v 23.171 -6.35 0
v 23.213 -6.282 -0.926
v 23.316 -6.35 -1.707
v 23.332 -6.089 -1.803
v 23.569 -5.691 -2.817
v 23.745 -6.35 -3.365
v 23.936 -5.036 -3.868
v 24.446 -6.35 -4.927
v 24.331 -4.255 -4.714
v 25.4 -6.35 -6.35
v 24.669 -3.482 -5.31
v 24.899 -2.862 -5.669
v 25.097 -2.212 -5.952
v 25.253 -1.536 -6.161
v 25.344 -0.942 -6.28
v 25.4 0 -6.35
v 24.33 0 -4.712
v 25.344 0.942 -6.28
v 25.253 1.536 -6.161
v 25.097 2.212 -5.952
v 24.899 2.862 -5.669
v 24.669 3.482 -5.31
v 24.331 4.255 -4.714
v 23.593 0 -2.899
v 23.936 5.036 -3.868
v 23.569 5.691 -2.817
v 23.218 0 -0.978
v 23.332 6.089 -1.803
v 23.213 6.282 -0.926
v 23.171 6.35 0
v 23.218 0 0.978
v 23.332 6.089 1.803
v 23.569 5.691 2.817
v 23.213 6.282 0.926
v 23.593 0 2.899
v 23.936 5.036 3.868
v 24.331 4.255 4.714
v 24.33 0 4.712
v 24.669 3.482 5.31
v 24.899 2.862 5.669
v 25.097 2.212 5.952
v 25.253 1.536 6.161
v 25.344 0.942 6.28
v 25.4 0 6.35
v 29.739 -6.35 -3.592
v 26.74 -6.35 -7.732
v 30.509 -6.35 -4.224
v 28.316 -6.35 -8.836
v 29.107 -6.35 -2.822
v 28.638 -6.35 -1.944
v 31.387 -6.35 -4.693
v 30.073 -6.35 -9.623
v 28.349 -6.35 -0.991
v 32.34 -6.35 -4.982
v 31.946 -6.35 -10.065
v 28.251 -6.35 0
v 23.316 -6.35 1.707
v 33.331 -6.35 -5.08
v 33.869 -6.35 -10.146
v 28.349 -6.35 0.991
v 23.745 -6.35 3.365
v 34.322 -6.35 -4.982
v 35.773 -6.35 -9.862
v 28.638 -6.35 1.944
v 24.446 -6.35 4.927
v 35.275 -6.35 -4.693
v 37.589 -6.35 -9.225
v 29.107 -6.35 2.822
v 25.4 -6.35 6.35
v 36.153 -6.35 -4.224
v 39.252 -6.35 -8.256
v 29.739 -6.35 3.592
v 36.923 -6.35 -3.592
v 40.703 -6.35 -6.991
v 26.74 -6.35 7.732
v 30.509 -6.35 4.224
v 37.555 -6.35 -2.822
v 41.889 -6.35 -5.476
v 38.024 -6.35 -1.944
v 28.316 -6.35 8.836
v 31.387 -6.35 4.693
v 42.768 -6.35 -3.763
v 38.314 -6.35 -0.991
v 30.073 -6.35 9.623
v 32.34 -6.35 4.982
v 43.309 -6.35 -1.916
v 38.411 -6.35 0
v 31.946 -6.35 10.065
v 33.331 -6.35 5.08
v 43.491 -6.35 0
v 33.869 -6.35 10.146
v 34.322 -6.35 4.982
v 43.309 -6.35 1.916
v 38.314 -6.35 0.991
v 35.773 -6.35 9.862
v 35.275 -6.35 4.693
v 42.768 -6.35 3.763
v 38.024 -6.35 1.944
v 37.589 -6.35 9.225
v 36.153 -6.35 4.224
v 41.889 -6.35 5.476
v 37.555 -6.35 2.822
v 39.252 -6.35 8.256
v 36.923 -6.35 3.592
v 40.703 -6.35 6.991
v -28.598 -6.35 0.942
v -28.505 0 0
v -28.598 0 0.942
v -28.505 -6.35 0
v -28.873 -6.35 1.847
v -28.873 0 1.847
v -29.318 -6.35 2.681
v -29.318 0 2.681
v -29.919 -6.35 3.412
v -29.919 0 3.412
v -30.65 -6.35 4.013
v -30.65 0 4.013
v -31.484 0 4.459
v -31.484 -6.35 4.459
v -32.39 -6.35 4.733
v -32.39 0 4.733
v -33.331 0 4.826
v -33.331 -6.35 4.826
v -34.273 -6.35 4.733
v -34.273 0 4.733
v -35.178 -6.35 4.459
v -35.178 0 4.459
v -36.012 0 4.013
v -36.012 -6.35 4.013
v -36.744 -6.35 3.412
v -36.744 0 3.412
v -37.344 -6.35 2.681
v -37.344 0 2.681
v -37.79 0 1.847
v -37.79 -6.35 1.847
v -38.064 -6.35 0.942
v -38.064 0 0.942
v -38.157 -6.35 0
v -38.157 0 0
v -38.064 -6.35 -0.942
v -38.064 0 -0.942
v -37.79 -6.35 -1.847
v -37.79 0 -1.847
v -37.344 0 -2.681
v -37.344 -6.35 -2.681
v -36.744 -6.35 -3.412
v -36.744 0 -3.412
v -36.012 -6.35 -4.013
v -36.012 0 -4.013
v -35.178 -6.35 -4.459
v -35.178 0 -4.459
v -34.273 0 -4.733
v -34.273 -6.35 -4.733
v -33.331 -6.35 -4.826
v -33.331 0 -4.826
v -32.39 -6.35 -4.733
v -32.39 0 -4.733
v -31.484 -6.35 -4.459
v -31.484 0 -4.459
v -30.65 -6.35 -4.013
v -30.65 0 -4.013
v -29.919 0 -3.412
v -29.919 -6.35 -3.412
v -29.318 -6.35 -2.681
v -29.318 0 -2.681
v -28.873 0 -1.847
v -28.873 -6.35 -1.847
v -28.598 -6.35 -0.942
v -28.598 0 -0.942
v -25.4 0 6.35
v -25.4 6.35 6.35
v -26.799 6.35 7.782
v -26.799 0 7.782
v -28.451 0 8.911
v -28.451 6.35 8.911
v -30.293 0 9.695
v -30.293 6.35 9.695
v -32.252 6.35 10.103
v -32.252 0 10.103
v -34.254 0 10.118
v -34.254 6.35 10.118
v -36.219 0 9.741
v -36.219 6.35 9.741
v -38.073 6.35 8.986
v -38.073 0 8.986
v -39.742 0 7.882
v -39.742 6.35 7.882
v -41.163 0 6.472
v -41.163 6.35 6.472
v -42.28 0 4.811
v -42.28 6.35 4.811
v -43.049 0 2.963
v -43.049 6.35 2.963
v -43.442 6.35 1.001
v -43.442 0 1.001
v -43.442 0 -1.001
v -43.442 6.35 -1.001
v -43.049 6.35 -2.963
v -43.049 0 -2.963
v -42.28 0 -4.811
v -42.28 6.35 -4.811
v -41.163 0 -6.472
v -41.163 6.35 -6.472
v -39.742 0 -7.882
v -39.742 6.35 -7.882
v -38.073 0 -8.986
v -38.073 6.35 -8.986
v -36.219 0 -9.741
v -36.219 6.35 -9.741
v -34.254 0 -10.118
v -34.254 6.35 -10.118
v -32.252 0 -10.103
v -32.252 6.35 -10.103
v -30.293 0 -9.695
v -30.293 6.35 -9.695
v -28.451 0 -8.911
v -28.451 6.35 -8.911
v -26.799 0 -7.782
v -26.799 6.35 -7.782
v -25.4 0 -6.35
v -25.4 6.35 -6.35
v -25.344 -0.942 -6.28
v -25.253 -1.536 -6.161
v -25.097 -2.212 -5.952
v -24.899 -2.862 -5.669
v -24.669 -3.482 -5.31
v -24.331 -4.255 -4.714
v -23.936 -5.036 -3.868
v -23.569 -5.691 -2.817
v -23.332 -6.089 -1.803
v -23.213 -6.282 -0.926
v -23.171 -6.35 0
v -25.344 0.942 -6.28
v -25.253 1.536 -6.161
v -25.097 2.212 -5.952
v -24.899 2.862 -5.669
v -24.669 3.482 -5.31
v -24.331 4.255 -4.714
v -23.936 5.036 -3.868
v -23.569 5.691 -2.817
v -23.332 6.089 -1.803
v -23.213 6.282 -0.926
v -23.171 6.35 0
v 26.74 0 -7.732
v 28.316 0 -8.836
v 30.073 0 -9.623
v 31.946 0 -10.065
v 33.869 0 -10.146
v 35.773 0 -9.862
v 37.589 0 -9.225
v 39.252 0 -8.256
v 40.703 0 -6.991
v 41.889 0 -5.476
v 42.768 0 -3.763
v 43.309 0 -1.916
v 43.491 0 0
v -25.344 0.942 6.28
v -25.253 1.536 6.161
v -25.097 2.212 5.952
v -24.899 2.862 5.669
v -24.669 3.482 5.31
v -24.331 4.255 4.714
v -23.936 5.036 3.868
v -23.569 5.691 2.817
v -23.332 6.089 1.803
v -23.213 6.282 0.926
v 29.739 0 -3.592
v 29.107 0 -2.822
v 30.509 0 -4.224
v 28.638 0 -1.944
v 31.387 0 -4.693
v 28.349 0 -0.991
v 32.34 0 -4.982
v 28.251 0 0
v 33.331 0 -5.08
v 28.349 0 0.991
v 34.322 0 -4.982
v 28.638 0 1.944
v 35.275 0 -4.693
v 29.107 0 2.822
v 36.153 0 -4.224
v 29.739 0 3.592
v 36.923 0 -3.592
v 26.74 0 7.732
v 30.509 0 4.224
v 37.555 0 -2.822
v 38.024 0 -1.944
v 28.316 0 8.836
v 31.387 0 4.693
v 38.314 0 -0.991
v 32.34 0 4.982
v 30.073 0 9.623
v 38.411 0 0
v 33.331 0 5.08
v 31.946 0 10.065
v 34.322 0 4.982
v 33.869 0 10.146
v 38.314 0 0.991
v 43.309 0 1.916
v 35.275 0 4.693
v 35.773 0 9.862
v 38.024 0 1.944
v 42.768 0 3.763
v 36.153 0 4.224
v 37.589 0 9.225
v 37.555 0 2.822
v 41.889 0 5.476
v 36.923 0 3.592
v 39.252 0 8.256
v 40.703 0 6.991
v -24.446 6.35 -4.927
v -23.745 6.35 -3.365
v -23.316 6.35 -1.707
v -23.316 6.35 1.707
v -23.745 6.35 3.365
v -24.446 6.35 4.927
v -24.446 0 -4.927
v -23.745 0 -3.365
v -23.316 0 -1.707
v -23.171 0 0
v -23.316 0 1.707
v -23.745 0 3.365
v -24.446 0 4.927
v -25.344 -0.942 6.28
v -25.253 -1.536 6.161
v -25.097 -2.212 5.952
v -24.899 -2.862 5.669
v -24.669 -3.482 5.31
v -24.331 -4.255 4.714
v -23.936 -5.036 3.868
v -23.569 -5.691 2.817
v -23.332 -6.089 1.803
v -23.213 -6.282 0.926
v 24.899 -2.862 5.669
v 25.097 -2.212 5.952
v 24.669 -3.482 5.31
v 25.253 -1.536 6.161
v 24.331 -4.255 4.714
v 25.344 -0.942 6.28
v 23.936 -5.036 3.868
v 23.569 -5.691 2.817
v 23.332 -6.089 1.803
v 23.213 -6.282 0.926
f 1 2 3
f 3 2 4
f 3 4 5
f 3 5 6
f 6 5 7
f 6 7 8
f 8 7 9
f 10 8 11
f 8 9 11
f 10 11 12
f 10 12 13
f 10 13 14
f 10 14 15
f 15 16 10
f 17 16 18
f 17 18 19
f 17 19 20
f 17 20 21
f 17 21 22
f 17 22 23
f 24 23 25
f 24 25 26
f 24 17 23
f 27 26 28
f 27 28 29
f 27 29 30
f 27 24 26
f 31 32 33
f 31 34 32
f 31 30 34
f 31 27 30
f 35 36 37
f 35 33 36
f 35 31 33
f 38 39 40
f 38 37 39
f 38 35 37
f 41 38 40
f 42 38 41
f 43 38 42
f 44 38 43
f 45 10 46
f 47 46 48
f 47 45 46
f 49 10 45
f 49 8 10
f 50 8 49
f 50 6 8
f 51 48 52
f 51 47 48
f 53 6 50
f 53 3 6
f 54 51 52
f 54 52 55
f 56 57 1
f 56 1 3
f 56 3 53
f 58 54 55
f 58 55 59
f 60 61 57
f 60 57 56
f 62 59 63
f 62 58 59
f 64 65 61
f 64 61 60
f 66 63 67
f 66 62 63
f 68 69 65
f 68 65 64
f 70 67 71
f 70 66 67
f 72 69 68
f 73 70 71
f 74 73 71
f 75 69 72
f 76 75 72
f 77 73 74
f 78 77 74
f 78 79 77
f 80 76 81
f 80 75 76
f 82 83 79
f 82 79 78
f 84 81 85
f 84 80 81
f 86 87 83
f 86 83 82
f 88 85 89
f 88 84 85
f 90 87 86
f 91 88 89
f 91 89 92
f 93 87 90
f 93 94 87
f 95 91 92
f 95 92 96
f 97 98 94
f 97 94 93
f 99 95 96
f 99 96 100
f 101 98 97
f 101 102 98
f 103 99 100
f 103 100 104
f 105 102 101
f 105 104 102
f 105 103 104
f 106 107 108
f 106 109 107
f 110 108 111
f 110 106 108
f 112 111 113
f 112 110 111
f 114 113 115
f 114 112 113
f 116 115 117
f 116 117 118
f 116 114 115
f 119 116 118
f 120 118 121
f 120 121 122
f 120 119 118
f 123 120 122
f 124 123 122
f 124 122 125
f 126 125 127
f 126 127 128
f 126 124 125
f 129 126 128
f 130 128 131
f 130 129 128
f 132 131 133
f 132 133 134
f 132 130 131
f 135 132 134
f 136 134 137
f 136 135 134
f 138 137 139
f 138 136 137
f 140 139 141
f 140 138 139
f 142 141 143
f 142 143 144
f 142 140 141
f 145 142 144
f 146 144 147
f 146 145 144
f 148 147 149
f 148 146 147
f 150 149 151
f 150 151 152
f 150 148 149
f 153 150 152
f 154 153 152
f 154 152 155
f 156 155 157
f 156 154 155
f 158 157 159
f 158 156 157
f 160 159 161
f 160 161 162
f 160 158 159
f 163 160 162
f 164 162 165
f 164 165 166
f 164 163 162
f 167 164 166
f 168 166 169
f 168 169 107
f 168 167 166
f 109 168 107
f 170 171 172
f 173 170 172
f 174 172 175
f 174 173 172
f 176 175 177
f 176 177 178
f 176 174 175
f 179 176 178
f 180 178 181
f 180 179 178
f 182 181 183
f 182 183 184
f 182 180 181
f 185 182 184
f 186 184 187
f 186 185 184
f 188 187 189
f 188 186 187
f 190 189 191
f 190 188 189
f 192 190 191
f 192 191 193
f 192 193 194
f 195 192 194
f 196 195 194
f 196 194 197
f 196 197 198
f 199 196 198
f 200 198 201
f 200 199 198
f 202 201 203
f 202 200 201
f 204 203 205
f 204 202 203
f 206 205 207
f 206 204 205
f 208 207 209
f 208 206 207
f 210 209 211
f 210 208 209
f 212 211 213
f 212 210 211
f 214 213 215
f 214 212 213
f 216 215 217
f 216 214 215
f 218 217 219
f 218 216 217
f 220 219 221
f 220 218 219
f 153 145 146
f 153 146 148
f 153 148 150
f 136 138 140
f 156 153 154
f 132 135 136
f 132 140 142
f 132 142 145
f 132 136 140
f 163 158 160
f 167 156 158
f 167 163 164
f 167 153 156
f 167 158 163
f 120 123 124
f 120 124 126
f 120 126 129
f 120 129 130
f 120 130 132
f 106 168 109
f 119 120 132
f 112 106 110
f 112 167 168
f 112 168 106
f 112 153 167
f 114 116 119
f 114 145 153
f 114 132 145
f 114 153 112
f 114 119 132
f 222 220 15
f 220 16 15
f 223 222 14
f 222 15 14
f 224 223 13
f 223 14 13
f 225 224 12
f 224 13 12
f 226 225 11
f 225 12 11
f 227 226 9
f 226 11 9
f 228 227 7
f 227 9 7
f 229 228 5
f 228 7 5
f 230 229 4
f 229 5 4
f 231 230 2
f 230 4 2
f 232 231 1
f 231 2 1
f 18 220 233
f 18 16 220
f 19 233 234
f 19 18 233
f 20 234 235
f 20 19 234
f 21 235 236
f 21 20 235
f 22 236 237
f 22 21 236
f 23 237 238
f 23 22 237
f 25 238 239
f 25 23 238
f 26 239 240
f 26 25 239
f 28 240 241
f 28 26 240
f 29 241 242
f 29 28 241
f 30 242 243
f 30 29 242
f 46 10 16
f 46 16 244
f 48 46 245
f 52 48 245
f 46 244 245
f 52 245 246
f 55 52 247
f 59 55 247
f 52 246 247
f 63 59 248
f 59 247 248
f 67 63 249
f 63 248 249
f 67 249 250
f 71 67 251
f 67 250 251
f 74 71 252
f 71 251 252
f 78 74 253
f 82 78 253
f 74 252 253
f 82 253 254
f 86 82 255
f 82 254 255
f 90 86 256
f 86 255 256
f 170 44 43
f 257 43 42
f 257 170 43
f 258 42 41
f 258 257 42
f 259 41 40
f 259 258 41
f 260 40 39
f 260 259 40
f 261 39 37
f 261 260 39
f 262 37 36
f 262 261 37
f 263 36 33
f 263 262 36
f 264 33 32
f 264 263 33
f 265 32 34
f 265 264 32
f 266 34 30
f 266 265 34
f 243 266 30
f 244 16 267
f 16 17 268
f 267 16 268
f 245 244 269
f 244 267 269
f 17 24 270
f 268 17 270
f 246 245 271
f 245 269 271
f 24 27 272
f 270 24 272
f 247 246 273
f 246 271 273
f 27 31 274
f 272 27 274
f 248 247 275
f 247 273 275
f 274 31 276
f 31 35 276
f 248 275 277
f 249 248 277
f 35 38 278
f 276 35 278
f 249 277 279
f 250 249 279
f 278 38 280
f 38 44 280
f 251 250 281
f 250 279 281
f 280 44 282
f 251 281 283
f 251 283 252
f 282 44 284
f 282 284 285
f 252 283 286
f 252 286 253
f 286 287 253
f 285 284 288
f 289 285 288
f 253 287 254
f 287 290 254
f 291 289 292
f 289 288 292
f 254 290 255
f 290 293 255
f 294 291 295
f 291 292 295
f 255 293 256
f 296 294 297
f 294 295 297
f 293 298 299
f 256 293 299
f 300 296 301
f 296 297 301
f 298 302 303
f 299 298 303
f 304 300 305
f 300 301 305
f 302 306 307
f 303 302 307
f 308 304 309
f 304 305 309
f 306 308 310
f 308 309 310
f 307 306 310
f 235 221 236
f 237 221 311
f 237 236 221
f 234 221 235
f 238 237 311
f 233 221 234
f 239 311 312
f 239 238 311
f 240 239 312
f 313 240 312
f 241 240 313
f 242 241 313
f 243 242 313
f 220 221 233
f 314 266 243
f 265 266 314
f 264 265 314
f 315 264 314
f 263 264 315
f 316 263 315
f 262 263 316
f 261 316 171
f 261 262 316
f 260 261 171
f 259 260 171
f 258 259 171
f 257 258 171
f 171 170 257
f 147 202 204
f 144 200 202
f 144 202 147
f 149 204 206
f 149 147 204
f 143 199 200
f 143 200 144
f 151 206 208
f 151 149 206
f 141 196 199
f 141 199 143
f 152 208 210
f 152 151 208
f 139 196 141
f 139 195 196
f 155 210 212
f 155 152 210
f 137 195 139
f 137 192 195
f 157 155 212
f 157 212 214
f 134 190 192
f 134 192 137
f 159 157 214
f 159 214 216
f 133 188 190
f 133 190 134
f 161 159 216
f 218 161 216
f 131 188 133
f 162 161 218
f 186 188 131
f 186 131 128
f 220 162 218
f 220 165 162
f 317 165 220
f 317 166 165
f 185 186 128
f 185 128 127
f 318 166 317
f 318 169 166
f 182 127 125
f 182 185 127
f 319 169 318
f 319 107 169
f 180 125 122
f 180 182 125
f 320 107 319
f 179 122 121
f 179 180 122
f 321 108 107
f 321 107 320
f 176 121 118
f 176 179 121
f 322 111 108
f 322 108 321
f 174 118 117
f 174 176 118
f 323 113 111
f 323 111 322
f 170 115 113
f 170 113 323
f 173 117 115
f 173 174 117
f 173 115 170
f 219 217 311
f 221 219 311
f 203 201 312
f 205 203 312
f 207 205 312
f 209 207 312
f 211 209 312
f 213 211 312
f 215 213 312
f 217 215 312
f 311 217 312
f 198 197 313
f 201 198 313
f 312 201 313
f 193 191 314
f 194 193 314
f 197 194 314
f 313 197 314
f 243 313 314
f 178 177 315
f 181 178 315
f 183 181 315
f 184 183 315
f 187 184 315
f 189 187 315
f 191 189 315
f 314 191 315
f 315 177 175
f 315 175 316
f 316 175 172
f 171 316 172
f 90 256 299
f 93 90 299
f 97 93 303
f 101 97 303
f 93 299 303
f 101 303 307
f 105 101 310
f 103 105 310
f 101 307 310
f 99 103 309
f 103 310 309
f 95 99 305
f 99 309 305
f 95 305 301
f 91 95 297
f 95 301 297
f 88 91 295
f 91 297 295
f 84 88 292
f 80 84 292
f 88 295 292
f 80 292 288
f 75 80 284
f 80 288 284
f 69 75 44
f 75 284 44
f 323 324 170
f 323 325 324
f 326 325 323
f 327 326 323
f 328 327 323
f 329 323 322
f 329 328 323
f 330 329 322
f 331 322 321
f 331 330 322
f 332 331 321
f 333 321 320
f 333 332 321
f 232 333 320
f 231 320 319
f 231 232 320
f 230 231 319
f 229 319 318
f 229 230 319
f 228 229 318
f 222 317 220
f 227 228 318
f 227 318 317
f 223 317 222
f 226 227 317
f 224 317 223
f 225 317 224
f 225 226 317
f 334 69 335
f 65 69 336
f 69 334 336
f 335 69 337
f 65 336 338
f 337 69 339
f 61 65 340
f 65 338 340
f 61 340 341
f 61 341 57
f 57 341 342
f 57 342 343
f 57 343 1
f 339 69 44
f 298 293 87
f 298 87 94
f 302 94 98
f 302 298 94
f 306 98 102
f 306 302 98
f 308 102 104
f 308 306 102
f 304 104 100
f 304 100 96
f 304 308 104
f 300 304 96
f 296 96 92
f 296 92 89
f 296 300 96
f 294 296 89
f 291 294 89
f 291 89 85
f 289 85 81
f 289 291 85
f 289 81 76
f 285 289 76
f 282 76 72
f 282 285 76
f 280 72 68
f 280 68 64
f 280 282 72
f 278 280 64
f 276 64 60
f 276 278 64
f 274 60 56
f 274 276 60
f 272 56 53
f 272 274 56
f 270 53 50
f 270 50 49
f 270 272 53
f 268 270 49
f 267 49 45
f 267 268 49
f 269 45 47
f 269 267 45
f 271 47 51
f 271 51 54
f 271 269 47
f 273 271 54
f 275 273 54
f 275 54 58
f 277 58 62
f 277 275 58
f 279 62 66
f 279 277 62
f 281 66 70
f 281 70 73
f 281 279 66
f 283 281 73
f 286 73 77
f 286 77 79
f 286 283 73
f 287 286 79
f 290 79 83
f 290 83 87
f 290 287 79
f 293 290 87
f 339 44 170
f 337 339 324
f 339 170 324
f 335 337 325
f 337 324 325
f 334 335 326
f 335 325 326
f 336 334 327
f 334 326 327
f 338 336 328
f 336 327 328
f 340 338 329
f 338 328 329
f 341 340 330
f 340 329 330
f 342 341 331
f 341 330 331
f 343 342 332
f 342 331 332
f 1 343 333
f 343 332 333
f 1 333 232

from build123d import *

# Parameters (mm, degrees)
F1_DEPTH = 6.35
F2_R     = 6.3499
F0_R     = 5.08
F3_DEPTH = 6.35
F0_R_2   = 4.826
F4_DEPTH = 6.35
F5_DEPTH = 6.35


# Not quite as in the source:
# - a fillet or chamfer is up to 0.001 mm smaller than in the source, because OpenCascade refuses the exact size


with BuildPart() as f1:
    # F0 (on Front) → F1 (new body, symmetric)
    with BuildSketch(Plane.XZ):
        with BuildLine():
            Line((25.4, 6.35), (-25.4, 6.35))
            ThreePointArc((-25.4, 6.35), (-23.7445407024, 3.3649028089), (-23.171147458, 0))
            ThreePointArc((-23.171147458, 0), (-23.7445407024, -3.3649028089), (-25.4, -6.35))
            Line((-25.4, -6.35), (25.4, -6.35))
            ThreePointArc((25.4, -6.35), (23.171147458, 0), (25.4, 6.35))
        make_face()
    extrude(amount=F1_DEPTH, both=True)

    # F2 (radius 6.35 in the source; OpenCascade refuses exactly that, so slightly less here)
    f2_edges = [f1.edges().sort_by_distance(p)[0] for p in [
        (0, -6.35, 6.35),
        (0, 6.35, 6.35),
        (0, -6.35, -6.35),
        (0, 6.35, -6.35),
    ]]
    fillet(f2_edges, radius=F2_R)

    # F0 (on Front) → F3 (join)
    with BuildSketch(Plane.XZ):
        with BuildLine():
            ThreePointArc((43.491147458, 0), (36.6960502669, 9.5866067556), (25.4, 6.35))
            Line((25.4, 6.35), (25.4, -6.35))
            ThreePointArc((25.4, -6.35), (36.6960502669, -9.5866067556), (43.491147458, 0))
        make_face()
        with Locations((33.331147458, 0)):
            Circle(F0_R, mode=Mode.SUBTRACT)
        with BuildLine():
            Line((25.4, -6.35), (25.4, 6.35))
            ThreePointArc((25.4, 6.35), (23.171147458, 0), (25.4, -6.35))
        make_face()
    extrude(amount=F3_DEPTH)

    # F0 (on Front) → F4 (join)
    with BuildSketch(Plane.XZ):
        with BuildLine():
            Line((-25.4, -6.35), (-25.4, 6.35))
            ThreePointArc((-25.4, 6.35), (-43.491147458, 0), (-25.4, -6.35))
        make_face()
        with Locations((-33.331147458, 0)):
            Circle(F0_R_2, mode=Mode.SUBTRACT)
        with BuildLine():
            ThreePointArc((-23.171147458, 0), (-23.7445407024, 3.3649028089), (-25.4, 6.35))
            Line((-25.4, 6.35), (-25.4, -6.35))
            ThreePointArc((-25.4, -6.35), (-23.7445407024, -3.3649028089), (-23.171147458, 0))
        make_face()
    extrude(amount=-F4_DEPTH)

    # F0 (on Front) → F5 (join, symmetric)
    with BuildSketch(Plane.XZ):
        with Locations((-33.331147458, 0)):
            Circle(F0_R_2)
    extrude(amount=F5_DEPTH, both=True)


solid = f1.part
